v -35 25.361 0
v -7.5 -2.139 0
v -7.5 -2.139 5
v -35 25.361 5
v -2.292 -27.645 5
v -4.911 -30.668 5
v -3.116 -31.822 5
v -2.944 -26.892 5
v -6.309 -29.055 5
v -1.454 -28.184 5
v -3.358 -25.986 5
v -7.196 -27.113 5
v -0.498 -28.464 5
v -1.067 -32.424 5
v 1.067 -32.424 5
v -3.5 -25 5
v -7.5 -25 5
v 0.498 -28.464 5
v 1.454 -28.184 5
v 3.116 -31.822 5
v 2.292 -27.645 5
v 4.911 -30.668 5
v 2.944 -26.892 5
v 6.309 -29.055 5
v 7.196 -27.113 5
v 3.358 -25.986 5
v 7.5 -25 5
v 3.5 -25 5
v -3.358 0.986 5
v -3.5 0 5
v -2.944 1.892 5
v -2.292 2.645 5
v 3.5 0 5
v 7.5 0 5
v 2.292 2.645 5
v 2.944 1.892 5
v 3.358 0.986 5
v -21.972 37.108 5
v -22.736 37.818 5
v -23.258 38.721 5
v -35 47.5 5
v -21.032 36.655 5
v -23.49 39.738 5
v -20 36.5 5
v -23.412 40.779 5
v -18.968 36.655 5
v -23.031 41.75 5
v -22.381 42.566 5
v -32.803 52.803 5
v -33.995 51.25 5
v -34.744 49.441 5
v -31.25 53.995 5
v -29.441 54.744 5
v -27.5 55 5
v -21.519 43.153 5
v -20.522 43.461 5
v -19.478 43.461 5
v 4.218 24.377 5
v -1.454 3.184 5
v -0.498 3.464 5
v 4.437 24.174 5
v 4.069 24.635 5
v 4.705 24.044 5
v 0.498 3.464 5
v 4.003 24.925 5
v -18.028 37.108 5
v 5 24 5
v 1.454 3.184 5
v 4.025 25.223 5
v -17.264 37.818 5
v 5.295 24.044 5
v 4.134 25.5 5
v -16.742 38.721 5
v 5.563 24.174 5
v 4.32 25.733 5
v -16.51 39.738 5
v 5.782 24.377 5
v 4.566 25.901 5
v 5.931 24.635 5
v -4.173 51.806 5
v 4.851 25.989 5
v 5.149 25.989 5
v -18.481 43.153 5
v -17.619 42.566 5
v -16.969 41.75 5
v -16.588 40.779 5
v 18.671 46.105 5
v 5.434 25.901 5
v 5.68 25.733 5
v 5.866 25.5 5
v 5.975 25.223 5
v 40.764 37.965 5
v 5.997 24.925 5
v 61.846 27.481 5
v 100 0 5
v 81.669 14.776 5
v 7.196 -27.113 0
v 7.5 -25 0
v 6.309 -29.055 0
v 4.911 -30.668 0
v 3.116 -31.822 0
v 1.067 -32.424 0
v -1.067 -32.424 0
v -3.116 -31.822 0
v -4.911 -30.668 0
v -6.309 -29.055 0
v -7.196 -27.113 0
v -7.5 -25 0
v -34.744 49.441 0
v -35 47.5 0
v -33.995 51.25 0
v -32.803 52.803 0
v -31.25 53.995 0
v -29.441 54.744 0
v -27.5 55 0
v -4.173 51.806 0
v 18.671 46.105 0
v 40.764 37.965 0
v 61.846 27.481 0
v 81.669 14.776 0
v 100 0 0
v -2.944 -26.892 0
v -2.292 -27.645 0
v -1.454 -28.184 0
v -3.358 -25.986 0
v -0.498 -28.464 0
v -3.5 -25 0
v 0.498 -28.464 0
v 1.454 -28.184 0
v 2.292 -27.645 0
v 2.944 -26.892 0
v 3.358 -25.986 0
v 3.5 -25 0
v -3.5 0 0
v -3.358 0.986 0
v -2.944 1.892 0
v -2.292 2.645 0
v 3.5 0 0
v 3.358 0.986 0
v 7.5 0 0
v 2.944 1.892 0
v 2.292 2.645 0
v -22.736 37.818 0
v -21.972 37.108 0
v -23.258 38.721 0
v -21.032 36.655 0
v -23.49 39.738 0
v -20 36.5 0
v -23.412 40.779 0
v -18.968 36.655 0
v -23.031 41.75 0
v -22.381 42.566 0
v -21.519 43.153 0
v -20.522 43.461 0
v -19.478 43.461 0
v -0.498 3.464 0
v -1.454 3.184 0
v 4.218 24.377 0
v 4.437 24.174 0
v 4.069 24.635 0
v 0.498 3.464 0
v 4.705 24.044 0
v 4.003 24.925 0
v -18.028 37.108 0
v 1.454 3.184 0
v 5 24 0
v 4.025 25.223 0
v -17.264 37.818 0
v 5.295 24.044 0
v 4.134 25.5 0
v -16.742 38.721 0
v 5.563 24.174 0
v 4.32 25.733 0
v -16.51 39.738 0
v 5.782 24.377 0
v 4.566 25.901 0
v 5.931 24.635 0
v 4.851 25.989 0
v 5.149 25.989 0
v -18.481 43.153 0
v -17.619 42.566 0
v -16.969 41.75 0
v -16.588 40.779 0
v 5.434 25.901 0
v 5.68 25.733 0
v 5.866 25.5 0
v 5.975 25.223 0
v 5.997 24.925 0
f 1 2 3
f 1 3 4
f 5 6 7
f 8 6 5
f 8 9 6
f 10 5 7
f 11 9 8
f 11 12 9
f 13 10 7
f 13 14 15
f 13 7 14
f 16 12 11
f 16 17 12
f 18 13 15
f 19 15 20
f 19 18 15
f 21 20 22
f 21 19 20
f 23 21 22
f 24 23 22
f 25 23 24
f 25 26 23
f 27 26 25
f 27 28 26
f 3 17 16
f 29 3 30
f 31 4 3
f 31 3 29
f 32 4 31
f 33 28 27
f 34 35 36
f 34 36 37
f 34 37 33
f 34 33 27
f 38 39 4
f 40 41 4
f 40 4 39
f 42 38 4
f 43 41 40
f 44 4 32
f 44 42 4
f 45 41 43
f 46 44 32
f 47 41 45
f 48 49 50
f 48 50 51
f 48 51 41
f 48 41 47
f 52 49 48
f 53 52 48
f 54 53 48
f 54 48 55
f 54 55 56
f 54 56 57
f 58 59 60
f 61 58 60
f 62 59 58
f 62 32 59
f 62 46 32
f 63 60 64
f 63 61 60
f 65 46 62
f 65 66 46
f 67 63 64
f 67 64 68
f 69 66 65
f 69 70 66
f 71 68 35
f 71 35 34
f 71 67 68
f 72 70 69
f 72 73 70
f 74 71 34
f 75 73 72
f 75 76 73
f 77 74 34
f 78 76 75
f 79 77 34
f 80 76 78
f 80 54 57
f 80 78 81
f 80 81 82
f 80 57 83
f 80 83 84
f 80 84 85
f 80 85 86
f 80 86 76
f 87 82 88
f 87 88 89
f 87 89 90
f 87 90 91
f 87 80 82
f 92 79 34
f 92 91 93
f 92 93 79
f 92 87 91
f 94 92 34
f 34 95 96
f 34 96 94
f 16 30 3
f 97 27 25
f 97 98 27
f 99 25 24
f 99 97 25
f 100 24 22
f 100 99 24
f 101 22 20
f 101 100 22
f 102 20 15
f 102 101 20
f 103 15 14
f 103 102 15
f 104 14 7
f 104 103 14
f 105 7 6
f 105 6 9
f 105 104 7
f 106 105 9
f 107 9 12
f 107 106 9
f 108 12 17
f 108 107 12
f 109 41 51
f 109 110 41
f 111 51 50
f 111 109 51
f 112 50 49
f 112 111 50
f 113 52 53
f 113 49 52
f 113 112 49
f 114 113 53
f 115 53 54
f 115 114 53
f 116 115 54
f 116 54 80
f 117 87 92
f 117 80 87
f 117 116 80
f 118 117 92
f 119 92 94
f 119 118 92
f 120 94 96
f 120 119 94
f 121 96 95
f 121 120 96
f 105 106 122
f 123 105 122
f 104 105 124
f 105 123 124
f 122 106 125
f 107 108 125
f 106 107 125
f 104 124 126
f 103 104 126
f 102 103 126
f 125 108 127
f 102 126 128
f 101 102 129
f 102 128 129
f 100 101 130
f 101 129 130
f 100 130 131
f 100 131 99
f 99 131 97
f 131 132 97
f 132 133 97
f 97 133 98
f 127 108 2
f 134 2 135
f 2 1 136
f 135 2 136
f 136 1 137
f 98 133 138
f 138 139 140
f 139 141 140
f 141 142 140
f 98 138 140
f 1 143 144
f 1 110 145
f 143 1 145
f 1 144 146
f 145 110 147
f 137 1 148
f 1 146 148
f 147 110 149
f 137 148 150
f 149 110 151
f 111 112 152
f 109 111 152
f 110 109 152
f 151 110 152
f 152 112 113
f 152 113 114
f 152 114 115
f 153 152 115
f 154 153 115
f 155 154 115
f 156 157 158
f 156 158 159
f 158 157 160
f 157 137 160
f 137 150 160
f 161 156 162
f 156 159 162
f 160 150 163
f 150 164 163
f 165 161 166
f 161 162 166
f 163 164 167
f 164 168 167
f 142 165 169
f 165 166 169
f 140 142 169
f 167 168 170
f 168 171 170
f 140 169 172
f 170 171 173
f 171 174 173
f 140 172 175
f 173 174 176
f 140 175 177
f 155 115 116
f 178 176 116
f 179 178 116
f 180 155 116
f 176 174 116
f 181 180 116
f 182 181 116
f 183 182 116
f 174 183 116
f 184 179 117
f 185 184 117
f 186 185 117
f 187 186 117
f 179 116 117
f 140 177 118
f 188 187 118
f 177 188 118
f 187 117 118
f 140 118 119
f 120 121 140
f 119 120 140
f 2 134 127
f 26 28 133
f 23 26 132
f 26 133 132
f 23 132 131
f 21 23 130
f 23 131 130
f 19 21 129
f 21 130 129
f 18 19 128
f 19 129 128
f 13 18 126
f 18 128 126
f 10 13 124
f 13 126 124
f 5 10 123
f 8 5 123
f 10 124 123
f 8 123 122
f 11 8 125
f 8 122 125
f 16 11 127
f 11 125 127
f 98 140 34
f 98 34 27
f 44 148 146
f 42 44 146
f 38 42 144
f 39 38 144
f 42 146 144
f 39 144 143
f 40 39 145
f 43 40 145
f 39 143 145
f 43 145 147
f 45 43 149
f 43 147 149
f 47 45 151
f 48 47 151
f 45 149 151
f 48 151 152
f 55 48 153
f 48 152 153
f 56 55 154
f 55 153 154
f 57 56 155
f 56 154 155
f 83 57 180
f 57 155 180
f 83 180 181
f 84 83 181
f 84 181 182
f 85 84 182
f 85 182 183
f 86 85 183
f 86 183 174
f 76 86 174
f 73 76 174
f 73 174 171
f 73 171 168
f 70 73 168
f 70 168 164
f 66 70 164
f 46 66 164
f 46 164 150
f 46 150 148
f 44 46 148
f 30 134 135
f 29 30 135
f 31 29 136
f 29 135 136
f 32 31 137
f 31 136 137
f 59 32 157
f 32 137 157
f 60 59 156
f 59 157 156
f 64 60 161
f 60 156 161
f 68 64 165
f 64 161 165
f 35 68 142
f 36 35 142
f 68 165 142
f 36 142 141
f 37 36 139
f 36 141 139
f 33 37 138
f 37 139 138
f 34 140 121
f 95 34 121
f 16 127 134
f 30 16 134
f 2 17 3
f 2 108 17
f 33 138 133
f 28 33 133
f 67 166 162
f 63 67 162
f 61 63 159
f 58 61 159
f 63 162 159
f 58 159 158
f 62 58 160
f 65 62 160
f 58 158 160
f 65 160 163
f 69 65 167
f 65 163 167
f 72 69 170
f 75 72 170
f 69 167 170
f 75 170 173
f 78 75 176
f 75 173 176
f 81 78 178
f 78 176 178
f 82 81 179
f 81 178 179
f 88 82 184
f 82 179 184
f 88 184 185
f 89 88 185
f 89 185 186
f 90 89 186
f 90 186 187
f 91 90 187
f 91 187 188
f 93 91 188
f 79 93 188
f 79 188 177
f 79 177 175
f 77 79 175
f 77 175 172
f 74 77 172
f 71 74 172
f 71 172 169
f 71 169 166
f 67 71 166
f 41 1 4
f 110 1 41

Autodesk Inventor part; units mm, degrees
ref_plane "YZ Plane" through (0, 0, 0) normal (1, 0, 0) x (0, 1, 0)
ref_plane "XZ Plane" through (0, 0, 0) normal (0, 1, 0) x (-1, 0, 0)
ref_plane "XY Plane" through (0, 0, 0) normal (0, 0, 1) x (1, 0, 0)
sketch "Sketch1" plane through (0, 0, 0) normal (0, 0, 1) x (1, 0, 0)
  line L0 (7.5, 0) -> (7.5, -25)
  line L1 (0, -32.5) -> (0, -32.5)
  line L2 (-7.5, -25) -> (-7.5, -2.139)
  line L3 (0, 0) -> (0, -25) construction
  arc A0 (-7.5, -25) -> (0, -32.5) centre (0, -25) ccw
  arc A1 (0, -32.5) -> (7.5, -25) centre (0, -25) ccw
  line L4 (0, -28.5) -> (0, -28.5)
  line L5 (-3.5, -25) -> (-3.5, 0)
  line L6 (0, 3.5) -> (0, 3.5)
  line L7 (3.5, 0) -> (3.5, -25)
  arc A2 (-3.5, -25) -> (0, -28.5) centre (0, -25) ccw
  arc A3 (0, -28.5) -> (3.5, -25) centre (0, -25) ccw
  arc A4 (3.5, 0) -> (0, 3.5) centre (0, 0) ccw
  arc A5 (0, 3.5) -> (-3.5, 0) centre (0, 0) ccw
  line L8 (7.5, 0) -> (100, 0)
  line L9 (-35, 25.361) -> (-35, 47.5)
  line L10 (-7.5, -2.139) -> (-35, 25.361)
  line L11 (-7.5, -2.139) -> (31.3909, -2.139) construction
  arc A6 (-27.5, 55) -> (-35, 47.5) centre (-27.5, 47.5) ccw
  arc A7 (100, 0) -> (-27.5, 55) centre (-45.2542, -161.4415) ccw
  point P0 (0, 0)
  point P1 (-20, 40)
  point P2 (0, -28.5)
  point P3 (0, 3.5)
  point P4 (0, -32.5)
  dimension "d0" = 20
  dimension "d2" = 25
  dimension "d8" = 15
  dimension "d9" = 7.5
  dimension "d10" = 7.5
  dimension "d11" = 3.5
  dimension "d12" = 3.5
  dimension "d13" = 7
  dimension "d14" = 3.5
  dimension "d28" = 40
  dimension "d30" = 135
  dimension "d31" = 15
  dimension "d33" = 7.5
  dimension "d34" = 120
  dimension "d35" = 217.1685
  dimension "d36" = 27.5
extrude "Extrusion1" add sketch "Sketch1" along normal blind 5
sketch "Sketch3" plane through (0, 0, 5) normal (0, 0, 1) x (1, 0, 0)
  arc A0 (-27.7773, 74.9035) -> (-35, 67.9071) centre (-28, 67.9071) ccw projected
  point P0 (0, 0)
  point P1 (-20, 40)
  dimension "d26" = 20
  dimension "d27" = 40
hole "Hole1" at (-20, 40, 5) direction (0, 0, -1) diameter 7 end through all
sketch "Sketch4" plane through (0, 0, 5) normal (0, 0, 1) x (1, 0, 0)
  line L0 (7.5, 0) -> (100, 0) projected
  line L1 (-35, 47.5) -> (-35, 25.361) projected
  circle A0 centre (5, 25) radius 20 construction
  point P0 (0, 0)
  dimension "d37" = 25
  dimension "d38" = 40
  dimension "d39" = 40
hole "Hole2" at (5, 25, 5) direction (0, 0, -1) diameter 2 end through all
properties part number "Dedo-BC" material "MDF Medium Density Fiberboard"
